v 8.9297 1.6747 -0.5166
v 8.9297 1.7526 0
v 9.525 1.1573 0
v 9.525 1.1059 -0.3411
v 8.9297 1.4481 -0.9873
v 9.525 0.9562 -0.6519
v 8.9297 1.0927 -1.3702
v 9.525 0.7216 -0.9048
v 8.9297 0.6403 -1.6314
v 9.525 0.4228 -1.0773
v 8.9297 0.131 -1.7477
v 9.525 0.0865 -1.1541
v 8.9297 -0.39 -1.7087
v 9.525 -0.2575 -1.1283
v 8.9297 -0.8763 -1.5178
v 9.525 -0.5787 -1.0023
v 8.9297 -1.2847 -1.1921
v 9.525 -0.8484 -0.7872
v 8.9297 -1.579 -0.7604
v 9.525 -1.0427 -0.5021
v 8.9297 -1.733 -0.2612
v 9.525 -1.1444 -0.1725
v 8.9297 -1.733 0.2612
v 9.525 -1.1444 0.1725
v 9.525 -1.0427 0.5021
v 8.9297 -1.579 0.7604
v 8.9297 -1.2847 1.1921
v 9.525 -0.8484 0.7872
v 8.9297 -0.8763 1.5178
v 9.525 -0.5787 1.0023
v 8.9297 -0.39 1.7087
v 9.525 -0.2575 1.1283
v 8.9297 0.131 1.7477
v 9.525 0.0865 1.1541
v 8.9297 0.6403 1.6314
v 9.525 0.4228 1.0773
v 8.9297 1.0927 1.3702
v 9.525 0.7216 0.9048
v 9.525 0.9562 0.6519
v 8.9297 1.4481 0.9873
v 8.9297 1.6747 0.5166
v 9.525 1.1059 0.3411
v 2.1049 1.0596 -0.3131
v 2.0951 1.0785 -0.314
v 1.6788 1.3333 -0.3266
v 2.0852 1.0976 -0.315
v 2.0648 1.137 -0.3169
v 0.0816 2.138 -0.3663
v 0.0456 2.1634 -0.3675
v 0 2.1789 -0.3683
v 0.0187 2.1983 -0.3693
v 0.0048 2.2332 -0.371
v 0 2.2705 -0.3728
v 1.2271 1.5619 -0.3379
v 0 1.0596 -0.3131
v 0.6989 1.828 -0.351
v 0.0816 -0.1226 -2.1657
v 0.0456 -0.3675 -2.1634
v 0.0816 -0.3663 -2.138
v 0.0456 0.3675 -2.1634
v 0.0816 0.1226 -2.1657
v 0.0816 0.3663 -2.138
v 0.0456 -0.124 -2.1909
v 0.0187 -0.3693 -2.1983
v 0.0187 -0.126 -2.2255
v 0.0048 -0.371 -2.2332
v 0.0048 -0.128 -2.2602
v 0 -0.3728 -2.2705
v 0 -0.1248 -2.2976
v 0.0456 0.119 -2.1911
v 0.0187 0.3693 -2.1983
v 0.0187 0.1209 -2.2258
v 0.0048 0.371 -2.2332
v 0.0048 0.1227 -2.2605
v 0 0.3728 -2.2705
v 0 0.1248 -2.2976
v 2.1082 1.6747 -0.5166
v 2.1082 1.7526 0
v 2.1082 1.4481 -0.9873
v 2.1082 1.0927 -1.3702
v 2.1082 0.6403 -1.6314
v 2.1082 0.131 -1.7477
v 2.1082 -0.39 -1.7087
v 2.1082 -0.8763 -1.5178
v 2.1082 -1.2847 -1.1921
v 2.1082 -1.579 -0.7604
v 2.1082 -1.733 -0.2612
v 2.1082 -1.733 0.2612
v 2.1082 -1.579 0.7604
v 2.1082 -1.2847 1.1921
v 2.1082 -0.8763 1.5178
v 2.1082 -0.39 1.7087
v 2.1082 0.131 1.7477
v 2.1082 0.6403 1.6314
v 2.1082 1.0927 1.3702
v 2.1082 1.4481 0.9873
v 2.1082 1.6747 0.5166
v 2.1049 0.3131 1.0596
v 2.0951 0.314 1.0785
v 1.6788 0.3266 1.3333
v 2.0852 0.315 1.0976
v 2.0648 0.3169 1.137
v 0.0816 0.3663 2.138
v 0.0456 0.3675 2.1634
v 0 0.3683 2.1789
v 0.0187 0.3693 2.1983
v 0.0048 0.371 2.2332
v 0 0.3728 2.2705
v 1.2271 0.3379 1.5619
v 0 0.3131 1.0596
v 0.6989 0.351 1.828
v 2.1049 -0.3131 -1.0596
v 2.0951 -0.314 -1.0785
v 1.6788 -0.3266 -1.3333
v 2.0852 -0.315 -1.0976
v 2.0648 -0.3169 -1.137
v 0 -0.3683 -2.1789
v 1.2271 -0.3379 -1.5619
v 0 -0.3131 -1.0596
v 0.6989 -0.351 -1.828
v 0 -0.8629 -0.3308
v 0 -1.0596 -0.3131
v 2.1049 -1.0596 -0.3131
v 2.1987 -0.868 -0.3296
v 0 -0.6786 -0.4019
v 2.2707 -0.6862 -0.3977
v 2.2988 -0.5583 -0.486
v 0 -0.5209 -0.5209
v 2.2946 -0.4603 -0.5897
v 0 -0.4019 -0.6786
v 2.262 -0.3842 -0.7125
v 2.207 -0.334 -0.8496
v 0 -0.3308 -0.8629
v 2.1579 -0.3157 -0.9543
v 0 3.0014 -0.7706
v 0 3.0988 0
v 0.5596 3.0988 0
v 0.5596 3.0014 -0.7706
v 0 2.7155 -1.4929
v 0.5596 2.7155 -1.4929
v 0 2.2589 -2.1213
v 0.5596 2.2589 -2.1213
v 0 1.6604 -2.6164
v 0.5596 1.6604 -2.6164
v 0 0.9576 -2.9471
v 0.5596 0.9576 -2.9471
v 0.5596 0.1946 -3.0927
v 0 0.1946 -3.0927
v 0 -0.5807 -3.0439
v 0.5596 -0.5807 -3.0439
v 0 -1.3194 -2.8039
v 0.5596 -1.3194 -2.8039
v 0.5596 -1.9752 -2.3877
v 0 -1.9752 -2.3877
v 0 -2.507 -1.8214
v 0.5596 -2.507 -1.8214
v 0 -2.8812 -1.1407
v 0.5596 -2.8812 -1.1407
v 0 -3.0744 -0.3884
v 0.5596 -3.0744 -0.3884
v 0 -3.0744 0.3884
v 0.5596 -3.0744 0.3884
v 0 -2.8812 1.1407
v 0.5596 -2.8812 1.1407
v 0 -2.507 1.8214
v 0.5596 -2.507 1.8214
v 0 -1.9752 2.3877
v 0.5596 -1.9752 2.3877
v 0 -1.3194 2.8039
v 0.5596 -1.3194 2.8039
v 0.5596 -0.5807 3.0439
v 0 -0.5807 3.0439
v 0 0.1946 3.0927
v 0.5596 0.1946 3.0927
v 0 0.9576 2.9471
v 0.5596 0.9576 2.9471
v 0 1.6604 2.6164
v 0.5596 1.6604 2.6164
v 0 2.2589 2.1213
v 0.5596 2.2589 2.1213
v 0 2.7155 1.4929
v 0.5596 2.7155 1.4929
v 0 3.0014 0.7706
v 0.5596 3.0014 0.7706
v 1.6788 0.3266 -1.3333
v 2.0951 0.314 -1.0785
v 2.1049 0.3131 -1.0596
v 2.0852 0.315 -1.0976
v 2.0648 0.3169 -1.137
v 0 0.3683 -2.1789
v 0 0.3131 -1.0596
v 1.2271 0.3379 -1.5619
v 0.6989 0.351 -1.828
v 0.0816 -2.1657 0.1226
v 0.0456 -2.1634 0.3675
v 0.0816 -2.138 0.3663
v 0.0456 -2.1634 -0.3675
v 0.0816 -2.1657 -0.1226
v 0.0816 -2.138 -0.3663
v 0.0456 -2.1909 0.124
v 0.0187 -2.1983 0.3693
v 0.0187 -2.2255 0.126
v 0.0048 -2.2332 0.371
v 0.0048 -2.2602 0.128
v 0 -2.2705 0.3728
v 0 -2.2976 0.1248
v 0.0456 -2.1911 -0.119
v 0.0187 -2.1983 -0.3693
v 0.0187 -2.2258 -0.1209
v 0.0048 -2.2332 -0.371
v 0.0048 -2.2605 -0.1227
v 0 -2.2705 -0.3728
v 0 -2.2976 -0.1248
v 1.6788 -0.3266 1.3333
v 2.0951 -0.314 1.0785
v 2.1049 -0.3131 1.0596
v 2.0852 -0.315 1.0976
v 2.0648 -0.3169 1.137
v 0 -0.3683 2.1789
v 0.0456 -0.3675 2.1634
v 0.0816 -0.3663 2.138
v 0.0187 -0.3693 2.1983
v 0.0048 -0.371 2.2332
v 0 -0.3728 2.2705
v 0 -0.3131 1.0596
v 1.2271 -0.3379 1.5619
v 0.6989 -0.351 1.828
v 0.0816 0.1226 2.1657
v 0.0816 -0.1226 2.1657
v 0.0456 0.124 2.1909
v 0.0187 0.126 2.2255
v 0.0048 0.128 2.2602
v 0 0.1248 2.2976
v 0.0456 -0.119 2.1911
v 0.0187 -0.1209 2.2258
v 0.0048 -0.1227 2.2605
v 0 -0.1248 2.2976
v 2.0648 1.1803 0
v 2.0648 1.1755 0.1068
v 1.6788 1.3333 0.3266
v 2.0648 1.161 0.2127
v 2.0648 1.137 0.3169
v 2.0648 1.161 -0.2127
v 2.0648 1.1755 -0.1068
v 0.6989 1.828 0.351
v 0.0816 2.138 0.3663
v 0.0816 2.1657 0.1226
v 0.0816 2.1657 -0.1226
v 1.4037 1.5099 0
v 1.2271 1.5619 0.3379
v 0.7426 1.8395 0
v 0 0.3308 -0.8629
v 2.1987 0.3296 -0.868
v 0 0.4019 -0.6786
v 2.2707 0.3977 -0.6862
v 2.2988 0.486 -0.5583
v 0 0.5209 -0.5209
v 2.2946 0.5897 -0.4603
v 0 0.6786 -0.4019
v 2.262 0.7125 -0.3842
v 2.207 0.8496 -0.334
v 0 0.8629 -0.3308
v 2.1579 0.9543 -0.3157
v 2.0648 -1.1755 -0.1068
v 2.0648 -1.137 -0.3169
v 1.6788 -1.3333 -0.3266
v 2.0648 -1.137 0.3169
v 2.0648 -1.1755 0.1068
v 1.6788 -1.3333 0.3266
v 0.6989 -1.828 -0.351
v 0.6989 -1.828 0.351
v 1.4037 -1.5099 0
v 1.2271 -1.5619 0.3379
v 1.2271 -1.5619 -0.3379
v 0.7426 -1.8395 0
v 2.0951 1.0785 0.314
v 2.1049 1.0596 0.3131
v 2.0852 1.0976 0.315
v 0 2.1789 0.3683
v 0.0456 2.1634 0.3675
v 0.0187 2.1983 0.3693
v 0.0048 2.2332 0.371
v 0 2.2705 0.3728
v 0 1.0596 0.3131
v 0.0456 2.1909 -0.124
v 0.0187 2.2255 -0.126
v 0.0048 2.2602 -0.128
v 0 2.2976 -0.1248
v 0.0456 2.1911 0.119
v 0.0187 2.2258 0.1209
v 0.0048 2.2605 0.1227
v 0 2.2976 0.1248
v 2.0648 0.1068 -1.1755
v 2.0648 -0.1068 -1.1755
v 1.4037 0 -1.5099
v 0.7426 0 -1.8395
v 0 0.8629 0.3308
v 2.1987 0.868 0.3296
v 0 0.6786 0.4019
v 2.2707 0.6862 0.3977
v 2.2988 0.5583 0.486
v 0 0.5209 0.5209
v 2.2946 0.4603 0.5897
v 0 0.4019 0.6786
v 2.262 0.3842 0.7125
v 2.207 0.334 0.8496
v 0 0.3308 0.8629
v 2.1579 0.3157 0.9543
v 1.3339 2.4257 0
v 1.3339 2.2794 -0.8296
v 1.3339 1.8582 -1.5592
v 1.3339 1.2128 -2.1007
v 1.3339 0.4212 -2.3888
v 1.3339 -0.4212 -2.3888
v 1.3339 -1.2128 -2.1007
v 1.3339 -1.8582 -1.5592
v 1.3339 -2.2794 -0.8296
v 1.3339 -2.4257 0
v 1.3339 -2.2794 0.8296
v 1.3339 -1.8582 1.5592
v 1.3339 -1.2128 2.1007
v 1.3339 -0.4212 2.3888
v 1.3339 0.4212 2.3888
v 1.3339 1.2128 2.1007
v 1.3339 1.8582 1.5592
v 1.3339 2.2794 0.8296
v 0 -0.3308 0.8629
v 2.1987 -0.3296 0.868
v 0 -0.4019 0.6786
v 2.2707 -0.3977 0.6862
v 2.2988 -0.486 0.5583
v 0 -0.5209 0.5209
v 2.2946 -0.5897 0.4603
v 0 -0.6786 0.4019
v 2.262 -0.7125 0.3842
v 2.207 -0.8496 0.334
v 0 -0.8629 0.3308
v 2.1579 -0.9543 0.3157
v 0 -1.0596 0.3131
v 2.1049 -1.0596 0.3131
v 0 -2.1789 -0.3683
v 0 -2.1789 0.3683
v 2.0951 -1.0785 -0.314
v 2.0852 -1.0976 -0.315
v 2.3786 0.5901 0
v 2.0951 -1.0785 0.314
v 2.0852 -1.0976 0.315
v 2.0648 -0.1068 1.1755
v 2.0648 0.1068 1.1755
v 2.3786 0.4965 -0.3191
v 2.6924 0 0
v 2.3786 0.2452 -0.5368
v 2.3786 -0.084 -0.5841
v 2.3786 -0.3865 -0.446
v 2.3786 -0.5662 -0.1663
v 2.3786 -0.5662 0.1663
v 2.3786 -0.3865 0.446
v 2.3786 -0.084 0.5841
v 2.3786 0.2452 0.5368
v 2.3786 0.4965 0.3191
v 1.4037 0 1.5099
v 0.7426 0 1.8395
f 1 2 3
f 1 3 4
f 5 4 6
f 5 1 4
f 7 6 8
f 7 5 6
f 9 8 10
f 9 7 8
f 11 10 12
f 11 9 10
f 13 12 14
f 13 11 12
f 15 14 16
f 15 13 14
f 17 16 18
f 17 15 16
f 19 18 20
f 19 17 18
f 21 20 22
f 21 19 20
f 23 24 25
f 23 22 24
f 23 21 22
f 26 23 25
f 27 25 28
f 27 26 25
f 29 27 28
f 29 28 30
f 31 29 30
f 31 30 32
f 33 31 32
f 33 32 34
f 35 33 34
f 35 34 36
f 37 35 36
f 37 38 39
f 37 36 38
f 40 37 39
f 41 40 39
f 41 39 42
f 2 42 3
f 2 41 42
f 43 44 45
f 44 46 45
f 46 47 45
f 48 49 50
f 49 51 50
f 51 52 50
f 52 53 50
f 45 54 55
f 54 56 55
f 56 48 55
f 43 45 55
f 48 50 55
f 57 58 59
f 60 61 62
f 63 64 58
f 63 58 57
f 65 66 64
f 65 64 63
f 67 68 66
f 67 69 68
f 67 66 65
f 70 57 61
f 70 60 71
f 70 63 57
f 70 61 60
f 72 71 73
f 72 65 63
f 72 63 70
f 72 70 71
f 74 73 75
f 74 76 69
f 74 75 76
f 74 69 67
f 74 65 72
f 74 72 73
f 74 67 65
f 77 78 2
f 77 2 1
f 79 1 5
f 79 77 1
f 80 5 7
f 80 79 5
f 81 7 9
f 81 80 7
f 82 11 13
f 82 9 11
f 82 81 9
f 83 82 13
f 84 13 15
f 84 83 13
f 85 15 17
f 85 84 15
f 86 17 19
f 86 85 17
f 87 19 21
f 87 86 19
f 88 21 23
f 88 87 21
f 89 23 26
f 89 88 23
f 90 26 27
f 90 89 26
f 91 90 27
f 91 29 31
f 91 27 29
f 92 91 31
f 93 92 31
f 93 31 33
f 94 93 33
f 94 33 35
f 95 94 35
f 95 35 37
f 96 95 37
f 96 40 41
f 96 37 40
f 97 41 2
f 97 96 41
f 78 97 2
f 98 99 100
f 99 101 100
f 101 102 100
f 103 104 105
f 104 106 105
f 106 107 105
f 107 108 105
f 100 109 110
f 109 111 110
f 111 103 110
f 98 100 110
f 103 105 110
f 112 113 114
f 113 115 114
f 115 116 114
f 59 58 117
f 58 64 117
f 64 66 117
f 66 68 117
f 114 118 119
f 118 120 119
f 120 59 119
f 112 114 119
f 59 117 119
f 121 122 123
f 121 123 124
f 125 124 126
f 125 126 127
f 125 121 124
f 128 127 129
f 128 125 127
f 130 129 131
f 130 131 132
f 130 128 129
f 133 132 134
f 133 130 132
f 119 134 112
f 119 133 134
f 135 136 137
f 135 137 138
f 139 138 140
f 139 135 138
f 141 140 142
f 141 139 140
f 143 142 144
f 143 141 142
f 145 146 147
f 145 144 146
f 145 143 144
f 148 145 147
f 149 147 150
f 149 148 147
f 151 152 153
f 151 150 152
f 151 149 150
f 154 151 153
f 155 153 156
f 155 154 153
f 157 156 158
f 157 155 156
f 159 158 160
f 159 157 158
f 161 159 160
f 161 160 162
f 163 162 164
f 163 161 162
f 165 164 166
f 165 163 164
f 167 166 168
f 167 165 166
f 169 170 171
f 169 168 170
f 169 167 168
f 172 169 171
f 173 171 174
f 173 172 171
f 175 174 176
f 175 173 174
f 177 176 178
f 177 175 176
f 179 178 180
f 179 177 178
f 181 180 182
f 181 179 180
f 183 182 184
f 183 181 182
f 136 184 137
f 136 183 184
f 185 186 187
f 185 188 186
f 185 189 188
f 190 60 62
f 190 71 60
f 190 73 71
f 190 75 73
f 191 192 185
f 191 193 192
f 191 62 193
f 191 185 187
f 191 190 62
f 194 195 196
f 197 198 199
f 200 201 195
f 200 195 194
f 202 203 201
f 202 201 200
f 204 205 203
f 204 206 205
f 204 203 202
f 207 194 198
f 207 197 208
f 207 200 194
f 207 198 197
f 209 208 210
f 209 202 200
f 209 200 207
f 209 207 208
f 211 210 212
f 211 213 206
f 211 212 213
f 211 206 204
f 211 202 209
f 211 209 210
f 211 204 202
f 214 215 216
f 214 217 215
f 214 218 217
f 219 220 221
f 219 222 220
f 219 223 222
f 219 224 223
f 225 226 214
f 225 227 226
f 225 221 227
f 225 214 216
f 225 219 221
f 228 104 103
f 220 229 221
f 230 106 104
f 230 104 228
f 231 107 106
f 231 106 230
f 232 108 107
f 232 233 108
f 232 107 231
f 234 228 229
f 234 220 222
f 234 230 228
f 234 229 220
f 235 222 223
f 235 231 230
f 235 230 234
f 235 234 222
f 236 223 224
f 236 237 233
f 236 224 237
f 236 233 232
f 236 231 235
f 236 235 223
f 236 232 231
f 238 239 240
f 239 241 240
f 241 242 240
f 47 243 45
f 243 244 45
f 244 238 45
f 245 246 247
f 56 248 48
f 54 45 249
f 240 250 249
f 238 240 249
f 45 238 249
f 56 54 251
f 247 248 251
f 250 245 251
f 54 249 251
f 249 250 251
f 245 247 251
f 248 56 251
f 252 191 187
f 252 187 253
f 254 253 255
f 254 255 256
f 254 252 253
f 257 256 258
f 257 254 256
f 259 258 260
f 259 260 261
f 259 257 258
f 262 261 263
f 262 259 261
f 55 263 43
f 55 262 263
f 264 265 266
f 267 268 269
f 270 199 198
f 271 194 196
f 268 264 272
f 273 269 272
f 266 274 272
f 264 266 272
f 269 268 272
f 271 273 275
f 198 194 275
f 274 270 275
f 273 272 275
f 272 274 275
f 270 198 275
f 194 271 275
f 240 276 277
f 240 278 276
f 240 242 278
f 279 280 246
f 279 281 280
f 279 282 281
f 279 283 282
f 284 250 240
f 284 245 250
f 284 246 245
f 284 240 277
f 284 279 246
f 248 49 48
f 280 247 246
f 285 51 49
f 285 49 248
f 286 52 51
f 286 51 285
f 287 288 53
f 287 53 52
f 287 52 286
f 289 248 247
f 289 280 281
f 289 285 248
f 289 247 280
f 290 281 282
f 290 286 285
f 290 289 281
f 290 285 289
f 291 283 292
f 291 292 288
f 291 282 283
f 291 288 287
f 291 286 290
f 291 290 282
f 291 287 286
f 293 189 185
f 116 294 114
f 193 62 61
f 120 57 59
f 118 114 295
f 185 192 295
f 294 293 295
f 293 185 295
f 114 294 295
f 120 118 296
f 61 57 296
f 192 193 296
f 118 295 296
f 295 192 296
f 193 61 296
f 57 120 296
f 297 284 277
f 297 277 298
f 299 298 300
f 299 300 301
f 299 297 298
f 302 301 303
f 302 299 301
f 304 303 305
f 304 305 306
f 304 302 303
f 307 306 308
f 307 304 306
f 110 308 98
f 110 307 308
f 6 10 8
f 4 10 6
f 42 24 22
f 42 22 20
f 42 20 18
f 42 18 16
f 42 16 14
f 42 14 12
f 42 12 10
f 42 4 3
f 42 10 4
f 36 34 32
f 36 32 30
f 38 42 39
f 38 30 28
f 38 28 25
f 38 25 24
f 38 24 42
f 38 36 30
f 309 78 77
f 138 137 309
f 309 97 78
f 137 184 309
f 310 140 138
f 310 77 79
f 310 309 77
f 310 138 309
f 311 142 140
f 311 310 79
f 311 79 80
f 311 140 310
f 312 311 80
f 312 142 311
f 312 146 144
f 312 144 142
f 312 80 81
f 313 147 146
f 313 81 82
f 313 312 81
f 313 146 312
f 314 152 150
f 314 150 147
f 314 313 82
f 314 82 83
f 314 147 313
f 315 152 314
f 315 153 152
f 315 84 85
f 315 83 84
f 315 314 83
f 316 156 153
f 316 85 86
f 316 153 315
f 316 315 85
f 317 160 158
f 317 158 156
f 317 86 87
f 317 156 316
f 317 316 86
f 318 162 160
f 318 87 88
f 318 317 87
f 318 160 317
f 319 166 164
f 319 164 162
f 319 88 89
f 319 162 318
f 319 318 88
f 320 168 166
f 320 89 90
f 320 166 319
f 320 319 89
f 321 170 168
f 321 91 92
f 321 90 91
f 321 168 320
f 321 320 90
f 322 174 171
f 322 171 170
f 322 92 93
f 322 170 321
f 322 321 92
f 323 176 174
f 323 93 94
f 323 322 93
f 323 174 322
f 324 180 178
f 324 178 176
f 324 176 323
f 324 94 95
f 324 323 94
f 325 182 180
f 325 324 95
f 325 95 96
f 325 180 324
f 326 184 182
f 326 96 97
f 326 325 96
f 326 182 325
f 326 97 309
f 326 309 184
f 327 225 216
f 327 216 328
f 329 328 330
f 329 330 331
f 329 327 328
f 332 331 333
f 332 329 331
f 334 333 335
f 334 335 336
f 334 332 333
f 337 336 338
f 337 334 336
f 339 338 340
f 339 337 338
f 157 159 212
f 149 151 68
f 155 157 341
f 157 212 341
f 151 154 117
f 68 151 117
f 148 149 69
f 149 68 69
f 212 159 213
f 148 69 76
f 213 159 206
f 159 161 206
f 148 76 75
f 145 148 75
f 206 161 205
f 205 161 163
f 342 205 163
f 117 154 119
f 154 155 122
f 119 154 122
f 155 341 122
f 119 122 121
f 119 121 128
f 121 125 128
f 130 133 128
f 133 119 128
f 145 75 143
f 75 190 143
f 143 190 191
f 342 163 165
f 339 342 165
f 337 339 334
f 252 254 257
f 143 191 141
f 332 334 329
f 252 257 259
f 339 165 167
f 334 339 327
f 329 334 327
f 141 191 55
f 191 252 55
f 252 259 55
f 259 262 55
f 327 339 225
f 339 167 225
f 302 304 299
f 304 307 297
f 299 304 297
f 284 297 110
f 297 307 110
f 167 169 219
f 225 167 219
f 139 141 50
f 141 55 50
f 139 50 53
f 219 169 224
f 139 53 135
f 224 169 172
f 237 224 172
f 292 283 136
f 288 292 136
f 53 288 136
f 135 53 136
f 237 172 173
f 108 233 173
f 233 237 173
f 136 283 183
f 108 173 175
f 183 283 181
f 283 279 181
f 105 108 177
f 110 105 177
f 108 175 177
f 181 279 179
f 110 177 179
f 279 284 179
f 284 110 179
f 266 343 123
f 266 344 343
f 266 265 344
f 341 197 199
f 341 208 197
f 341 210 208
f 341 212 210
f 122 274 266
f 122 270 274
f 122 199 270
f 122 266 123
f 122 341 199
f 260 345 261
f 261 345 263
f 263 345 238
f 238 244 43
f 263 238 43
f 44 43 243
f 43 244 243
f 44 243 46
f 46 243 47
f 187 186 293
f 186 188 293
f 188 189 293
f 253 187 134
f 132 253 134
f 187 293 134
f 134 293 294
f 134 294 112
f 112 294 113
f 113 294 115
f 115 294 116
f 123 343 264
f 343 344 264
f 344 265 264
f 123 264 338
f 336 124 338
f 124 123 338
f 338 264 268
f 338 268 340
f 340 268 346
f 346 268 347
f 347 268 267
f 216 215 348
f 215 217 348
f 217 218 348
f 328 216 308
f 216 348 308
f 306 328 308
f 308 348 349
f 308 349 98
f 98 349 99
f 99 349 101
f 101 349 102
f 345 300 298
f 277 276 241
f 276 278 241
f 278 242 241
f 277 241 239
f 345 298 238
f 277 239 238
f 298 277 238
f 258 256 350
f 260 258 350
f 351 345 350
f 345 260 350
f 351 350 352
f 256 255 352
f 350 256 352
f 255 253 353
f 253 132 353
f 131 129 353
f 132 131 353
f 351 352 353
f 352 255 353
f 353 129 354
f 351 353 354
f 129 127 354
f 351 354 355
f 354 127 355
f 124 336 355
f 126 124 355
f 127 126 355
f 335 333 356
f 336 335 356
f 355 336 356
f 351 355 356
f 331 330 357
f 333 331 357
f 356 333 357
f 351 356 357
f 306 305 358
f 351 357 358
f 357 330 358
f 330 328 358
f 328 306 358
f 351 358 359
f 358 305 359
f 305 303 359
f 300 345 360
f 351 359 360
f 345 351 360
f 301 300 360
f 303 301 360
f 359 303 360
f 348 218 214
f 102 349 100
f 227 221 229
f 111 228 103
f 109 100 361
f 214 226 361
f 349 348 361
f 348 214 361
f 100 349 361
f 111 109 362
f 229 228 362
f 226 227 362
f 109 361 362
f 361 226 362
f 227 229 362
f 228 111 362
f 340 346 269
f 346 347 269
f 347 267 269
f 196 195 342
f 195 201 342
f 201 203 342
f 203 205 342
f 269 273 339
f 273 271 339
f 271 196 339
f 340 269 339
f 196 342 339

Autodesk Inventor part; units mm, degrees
ref_plane "YZ Plane" through (0, 0, 0) normal (1, 0, 0) x (0, 1, 0)
ref_plane "XZ Plane" through (0, 0, 0) normal (0, 1, 0) x (-1, 0, 0)
sketch "Sketch1" plane through (0, 0, 0) normal (0, 0, 1) x (1, 0, 0)
  line L0 (2.6924, 0) -> (9.525, 0)
  line L1 (9.525, 0) -> (9.525, 1.7526)
  line L2 (9.525, 1.7526) -> (2.1082, 1.7526)
  line L3 (0.5596, 3.0988) -> (0, 3.0988)
  line L4 (-1.905, 0) -> (11.43, 0) projected
  line L5 (0, -0.6198) -> (0, 3.7186) projected
  line L6 (0, 2.2098) -> (2.0648, 1.1803)
  line L7 (2.0648, 1.1803) -> (2.6924, 0)
  line L8 (2.1082, 1.7526) -> (0.5596, 3.0988)
  line L9 (0, 3.0988) -> (0, 2.2098)
  dimension "d2" = 3.5052
  dimension "d3" = 6.1976
  dimension "d4" = 2.6924
  dimension "d5" = 4.4196
  dimension "d6" = 26.5
  dimension "d7" = 62
  dimension "d13" = 41
  dimension "d14" = 2.1082
  dimension "d15" = 9.525
revolve "Body" add sketch "Sketch1" angle 360 about axis through (2.6924, 0, 0) along (1, 0, 0) contours L7 L6 L5 L3 L8 L2 L1 L0
sketch "Sketch2" plane through (0, 0, 0) normal (-1, 0, 0) x (0, 0, 1)
  line L0 (0, -4.3383) -> (0, 4.3383) projected
  line L1 (-4.3383, 0) -> (4.3383, 0) projected
  line L2 (0, 2.2098) -> (0, 0) construction
  line L3 (0, 0) -> (2.2098, 0) construction
  arc A0 (0.7366, 0) -> (0, 0.7366) centre (0, 0) ccw
  line L4 (0, 0) -> (0.7947, 0.7947) construction
  arc A1 (1.1049, 0) -> (0, 1.1049) centre (0, 0) ccw construction
  line L5 (0.3683, 2.1789) -> (0.3131, 1.0596)
  line L6 (2.1789, 0.3683) -> (1.0596, 0.3131)
  arc A2 (0.3131, 1.0596) -> (1.0596, 0.3131) centre (1.0245, 1.0245) ccw
  arc A3 (2.2098, 0) -> (2.1789, 0.3683) centre (0, 0) ccw
  arc A4 (0.3683, 2.1789) -> (0, 2.2098) centre (0, 0) ccw
  arc A5 (2.1789, 0.3683) -> (0.3683, 2.1789) centre (0, 0) ccw
  line L7 (0.3683, -2.1789) -> (0.3131, -1.0596)
  line L8 (2.1789, -0.3683) -> (1.0596, -0.3131)
  arc A6 (1.0596, -0.3131) -> (0.3131, -1.0596) centre (1.0245, -1.0245) ccw
  arc A7 (2.1789, -0.3683) -> (2.2098, 0) centre (0, 0) ccw
  arc A8 (0, -2.2098) -> (0.3683, -2.1789) centre (0, 0) ccw
  arc A9 (0.3683, -2.1789) -> (2.1789, -0.3683) centre (0, 0) ccw
  line L9 (-0.3683, 2.1789) -> (-0.3131, 1.0596)
  line L10 (-2.1789, 0.3683) -> (-1.0596, 0.3131)
  arc A10 (-1.0596, 0.3131) -> (-0.3131, 1.0596) centre (-1.0245, 1.0245) ccw
  arc A11 (-2.1789, 0.3683) -> (-2.2098, 0) centre (0, 0) ccw
  arc A12 (0, 2.2098) -> (-0.3683, 2.1789) centre (0, 0) ccw
  arc A13 (-0.3683, 2.1789) -> (-2.1789, 0.3683) centre (0, 0) ccw
  arc A14 (-2.1789, -0.3683) -> (-0.3683, -2.1789) centre (0, 0) ccw
  arc A15 (-0.3683, -2.1789) -> (0, -2.2098) centre (0, 0) ccw
  arc A16 (-2.2098, 0) -> (-2.1789, -0.3683) centre (0, 0) ccw
  line L11 (-2.1789, -0.3683) -> (-1.0596, -0.3131)
  arc A17 (-0.3131, -1.0596) -> (-1.0596, -0.3131) centre (-1.0245, -1.0245) ccw
  line L12 (-0.3683, -2.1789) -> (-0.3131, -1.0596)
  dimension "d18" = 45
  dimension "d19" = 1.4732
  dimension "d20" = 2.2098
  dimension "d21" = 4.4196
  dimension "d22" = 0.3683
extrude "Slot" add sketch "Sketch2" against normal up to next contours A2 L5 A5 L6 | L9 A10 L10 A13 | L7 A6 L8 A9 | A14 L11 A17 L12
fillet "Fillet1" radius 0.1473 4 edges at (0, 2.2098, 0) (0, 0, 2.2098) (0, -2.2098, 0) (0, 0, -2.2098)
thread "Thread" size "6-32 UNC" class "2A" standard "ANSI Unified Screw Threads" length 5.4324
chamfer "Chamfer1" distance 0.5953 distance2 0.5953 1 edges at (9.525, -1.7526, 0) measured on face at (9.525, 0.2072, 0.5462)
ref_plane "Work Plane2" through (2.032, 0, 0) normal (0, 1, 0) x (1, 0, 0)
equation "\"d2\" = GD"
equation "\"d3\" = KOD"
equation "\"d4\" = INTI"
equation "\"d5\" = SDM"
equation "\"d13\" = 0.5 * SEWI"
equation "\"d14\" = KOH"
equation "\"d15\" = NLG"
equation "\"d19\" = 0.333333 * SDM"
equation "\"d20\" = 0.5 * SDM"
equation "\"d21\" = SDM"
equation "\"d22\" = 0.5 * SBR"
equation "\"d45\" = INTI"
equation "\"d25\" = 0.2 * SBR"
equation "\"d9\" = GEL"
equation "\"d11\" = -0.5 * SPD + 0.5 * GD"
equation "\"d12\" = GUL"
equation "\"GD\" = NND"
equation "\"NLG\" = 9.525"
equation "\"GEL\" = 5.43243"
equation "\"KOD\" = 6.1976"
equation "\"KOH\" = 2.1082"
equation "\"SDM\" = 4.4196"
equation "\"INTI\" = 2.6924"
equation "\"SBR\" = 0.7366"
equation "\"GUL\" = 0.75 * GAL"
equation "\"SPD\" = 2.31458"
equation "\"SEWI\" = 82deg"
equation "\"d0\" = NLG"
equation "\"d1\" = KOH"
equation "\"d17\" = SDM"
equation "\"TOA\" = 30deg"
equation "\"THREADDIA\" = 3.5052"
equation "\"BDM\" = NND"
equation "\"NND\" = 3.5052"
equation "\"GAL\" = 0.79375"
equation "\"GD1\" = SPD"
properties part number "ANSI B18.6.3 - 6-32 x 3/8, CRFCHMSTII(5)" material "Steel, Mild"
